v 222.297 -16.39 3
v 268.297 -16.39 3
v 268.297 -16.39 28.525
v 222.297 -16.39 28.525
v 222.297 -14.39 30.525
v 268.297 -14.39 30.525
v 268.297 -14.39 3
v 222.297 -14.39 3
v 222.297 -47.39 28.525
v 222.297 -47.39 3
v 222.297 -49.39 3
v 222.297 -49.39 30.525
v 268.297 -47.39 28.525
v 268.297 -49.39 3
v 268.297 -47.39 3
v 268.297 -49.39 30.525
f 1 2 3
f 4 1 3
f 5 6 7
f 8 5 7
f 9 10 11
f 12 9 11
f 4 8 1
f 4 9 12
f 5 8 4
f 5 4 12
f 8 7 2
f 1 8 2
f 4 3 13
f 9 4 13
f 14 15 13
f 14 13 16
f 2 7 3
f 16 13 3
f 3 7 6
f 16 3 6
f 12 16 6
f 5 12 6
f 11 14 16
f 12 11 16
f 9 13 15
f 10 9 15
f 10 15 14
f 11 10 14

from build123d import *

# Parameters (mm, degrees)
EXTRUDE_THIN1_DEPTH = 46


with BuildPart() as part:
    # Sketch3 → Extrude-Thin1 (new body)
    with BuildSketch(Plane.ZY.offset(-268.297)):
        Polygon((3, -16.39), (28.524751964, -16.39), (28.524751964, -47.39), (3, -47.39), (3, -49.39), (30.524751964, -49.39), (30.524751964, -14.39), (3, -14.39), align=None)
    extrude(amount=EXTRUDE_THIN1_DEPTH)


solid = part.part
